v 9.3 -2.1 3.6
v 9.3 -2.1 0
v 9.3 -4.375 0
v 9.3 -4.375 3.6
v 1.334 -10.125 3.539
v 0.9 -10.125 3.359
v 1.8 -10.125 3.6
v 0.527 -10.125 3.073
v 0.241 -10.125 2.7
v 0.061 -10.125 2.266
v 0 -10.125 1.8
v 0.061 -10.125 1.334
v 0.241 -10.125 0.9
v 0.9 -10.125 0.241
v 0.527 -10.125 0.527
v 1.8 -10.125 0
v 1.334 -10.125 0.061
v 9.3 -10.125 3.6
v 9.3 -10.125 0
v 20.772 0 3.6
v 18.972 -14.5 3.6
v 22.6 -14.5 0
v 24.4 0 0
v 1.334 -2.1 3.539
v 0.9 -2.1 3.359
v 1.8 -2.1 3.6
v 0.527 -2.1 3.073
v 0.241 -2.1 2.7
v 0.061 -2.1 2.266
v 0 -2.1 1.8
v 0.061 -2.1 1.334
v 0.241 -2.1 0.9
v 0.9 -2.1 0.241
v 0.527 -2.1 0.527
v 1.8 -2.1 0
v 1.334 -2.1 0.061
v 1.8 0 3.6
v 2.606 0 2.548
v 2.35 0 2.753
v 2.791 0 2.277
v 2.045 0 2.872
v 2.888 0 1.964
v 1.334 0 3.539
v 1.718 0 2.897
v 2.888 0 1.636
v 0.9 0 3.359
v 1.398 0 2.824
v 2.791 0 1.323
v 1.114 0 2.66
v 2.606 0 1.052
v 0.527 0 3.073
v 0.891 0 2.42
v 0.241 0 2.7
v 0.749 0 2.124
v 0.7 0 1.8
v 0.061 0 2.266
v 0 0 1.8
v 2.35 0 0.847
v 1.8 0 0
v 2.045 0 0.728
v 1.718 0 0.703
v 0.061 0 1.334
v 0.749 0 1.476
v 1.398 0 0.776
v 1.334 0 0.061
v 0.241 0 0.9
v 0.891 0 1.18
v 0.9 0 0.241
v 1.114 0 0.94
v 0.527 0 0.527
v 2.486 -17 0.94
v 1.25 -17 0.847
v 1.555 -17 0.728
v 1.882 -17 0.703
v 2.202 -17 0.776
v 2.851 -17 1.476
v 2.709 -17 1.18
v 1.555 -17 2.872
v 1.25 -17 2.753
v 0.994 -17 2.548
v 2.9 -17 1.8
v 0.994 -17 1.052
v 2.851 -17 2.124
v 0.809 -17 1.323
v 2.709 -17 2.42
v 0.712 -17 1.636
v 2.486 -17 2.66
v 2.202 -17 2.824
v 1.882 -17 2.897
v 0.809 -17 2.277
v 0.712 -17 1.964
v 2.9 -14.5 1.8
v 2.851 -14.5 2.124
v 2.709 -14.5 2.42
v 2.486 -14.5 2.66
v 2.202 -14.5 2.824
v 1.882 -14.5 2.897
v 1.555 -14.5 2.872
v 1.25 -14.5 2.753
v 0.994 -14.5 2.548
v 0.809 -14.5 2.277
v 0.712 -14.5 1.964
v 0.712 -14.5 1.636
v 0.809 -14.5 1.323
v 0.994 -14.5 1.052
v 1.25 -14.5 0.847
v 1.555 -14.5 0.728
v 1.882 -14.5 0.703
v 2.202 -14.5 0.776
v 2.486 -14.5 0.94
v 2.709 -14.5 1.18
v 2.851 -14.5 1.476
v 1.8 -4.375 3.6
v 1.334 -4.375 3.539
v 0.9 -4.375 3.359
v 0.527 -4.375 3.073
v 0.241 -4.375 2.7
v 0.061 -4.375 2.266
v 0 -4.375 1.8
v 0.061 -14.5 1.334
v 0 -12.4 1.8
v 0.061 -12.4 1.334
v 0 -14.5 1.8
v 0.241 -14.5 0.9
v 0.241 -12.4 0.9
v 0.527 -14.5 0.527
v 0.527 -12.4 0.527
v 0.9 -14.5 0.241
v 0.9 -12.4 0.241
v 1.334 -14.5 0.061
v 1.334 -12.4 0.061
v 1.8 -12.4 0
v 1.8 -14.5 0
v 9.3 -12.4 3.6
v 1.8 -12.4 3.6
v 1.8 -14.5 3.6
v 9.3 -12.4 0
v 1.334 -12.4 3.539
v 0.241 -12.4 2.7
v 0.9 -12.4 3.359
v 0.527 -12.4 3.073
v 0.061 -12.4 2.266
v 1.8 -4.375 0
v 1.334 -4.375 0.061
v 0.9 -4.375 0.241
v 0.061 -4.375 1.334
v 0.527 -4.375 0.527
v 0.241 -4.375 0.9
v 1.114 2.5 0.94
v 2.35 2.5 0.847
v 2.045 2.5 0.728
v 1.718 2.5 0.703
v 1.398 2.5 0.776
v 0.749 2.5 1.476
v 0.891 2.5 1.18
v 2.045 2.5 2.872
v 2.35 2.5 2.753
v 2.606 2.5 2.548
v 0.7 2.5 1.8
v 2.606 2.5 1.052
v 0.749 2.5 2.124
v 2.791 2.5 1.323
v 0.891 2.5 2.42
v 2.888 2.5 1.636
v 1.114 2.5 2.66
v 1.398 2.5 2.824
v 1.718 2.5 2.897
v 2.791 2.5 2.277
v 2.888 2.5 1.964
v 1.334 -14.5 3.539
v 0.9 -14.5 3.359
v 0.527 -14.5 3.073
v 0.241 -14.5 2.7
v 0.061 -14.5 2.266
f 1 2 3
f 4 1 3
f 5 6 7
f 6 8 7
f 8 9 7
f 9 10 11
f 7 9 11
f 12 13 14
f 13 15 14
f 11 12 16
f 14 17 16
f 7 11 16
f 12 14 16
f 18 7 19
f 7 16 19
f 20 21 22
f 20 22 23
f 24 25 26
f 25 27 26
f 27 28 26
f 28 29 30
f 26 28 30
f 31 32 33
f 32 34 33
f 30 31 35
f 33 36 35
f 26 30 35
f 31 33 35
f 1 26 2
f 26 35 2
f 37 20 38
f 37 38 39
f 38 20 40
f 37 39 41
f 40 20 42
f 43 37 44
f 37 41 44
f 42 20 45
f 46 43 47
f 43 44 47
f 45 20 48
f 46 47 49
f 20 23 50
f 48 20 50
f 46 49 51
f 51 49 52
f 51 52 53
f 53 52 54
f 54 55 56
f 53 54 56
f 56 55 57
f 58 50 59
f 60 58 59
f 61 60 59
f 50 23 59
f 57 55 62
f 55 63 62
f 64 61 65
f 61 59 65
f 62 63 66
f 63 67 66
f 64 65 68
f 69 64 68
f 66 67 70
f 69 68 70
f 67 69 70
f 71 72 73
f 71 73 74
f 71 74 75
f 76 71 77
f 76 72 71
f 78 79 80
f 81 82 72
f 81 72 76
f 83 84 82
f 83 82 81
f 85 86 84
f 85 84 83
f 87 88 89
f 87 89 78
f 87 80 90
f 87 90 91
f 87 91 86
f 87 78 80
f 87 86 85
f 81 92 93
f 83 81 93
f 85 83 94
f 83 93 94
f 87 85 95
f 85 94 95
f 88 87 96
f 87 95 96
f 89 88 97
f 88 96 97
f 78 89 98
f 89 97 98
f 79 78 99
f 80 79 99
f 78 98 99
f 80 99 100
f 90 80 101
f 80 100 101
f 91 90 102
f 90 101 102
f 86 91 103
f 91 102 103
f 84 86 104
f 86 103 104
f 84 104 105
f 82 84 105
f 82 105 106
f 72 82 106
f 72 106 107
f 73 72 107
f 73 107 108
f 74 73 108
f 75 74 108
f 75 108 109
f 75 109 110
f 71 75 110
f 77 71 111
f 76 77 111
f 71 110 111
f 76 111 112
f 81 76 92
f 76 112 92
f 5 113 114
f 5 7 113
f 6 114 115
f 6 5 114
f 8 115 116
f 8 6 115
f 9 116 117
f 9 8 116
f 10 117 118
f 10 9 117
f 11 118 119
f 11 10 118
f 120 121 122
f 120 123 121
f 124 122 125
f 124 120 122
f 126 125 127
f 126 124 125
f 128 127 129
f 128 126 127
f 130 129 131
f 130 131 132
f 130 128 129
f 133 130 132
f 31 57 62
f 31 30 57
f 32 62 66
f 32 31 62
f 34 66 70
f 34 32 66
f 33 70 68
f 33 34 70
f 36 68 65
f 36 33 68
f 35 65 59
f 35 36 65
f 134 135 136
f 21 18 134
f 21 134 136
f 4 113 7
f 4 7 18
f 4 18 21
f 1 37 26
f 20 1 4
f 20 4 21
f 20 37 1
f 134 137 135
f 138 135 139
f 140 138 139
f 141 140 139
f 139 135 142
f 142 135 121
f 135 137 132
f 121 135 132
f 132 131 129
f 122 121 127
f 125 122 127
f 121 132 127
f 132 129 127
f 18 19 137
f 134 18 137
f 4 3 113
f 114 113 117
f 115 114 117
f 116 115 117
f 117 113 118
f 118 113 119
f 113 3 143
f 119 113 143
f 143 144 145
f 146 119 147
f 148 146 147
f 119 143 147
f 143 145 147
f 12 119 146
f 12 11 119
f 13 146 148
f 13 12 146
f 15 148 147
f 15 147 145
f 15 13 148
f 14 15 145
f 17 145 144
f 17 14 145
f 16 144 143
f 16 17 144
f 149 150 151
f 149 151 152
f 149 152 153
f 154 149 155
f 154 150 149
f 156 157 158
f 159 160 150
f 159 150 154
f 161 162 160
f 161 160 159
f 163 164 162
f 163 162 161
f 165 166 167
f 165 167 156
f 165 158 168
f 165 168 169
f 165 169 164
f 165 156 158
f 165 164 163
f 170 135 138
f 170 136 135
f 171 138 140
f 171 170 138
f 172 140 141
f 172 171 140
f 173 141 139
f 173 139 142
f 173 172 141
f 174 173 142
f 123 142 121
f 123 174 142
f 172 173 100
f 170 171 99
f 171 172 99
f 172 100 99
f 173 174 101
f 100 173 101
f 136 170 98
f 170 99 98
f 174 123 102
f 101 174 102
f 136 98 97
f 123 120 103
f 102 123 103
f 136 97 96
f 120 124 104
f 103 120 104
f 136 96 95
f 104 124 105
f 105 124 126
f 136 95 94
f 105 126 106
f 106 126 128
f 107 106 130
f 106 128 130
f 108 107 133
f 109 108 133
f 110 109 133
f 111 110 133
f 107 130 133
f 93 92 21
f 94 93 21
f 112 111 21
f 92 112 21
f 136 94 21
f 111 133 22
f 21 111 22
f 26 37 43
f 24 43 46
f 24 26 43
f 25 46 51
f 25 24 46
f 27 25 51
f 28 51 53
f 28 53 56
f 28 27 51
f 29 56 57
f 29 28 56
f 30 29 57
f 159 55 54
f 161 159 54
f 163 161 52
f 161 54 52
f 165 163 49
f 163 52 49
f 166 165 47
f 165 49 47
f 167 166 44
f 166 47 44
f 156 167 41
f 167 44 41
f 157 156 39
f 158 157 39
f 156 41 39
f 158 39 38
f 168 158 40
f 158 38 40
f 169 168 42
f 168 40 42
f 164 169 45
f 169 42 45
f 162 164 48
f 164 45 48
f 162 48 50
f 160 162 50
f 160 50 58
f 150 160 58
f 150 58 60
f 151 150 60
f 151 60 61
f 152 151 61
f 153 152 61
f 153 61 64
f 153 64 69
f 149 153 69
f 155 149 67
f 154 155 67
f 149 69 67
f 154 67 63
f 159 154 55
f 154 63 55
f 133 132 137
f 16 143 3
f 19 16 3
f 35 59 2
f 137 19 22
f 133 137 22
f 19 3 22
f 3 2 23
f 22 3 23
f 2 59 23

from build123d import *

# Parameters (mm, degrees)
F1_DEPTH  = 3.6
F2_SIZE2  = 3.59999
F2_SIZE   = 3.59999
F3_R      = 1.8
F4_R      = 1.79999
F5_R      = 1.8
F6_R      = 1.79999
F7_R      = 1.8
F8_R      = 1.79999
F9_R      = 1.1
F10_DEPTH = 2.5
F11_R     = 1.1
F12_DEPTH = 2.5


# Not quite as in the source:
# - a fillet or chamfer is up to 0.001 mm smaller than in the source, because OpenCascade refuses the exact size


with BuildPart() as f1:
    # F0 (on Top) → F1 (new body)
    with BuildSketch(Plane.XY):
        Polygon((24.4, 0), (0, 0), (0, -2.1), (9.3, -2.1), (9.3, -4.375), (0, -4.375), (0, -10.125), (9.3, -10.125), (9.3, -12.4), (0, -12.4), (0, -14.5), (22.6, -14.5), align=None)
    extrude(amount=F1_DEPTH)

    # F2 (size 3.6 and 3.6 in the source; OpenCascade refuses exactly that, so slightly less here)
    f2_edges = [f1.edges().sort_by_distance(p)[0] for p in [
        (23.5, -7.25, 3.6),
    ]]
    chamfer(f2_edges, length=F2_SIZE, length2=F2_SIZE2)

    # F3
    f3_edges = [f1.edges().sort_by_distance(p)[0] for p in [
        (0, -7.25, 3.6),
    ]]
    fillet(f3_edges, radius=F3_R)

    # F4 (radius 1.8 in the source; OpenCascade refuses exactly that, so slightly less here)
    f4_edges = [f1.edges().sort_by_distance(p)[0] for p in [
        (0, -7.25, 0),
    ]]
    fillet(f4_edges, radius=F4_R)

    # F5
    f5_edges = [f1.edges().sort_by_distance(p)[0] for p in [
        (0, -13.45, 3.6),
    ]]
    fillet(f5_edges, radius=F5_R)

    # F6 (radius 1.8 in the source; OpenCascade refuses exactly that, so slightly less here)
    f6_edges = [f1.edges().sort_by_distance(p)[0] for p in [
        (0, -13.45, 0),
    ]]
    fillet(f6_edges, radius=F6_R)

    # F7
    f7_edges = [f1.edges().sort_by_distance(p)[0] for p in [
        (0, -1.05, 3.6),
    ]]
    fillet(f7_edges, radius=F7_R)

    # F8 (radius 1.8 in the source; OpenCascade refuses exactly that, so slightly less here)
    f8_edges = [f1.edges().sort_by_distance(p)[0] for p in [
        (0, -1.05, 0),
    ]]
    fillet(f8_edges, radius=F8_R)

    # F9 (on face) → F10 (join)
    with BuildSketch(Plane.XZ.offset(14.5)):
        with Locations((1.8, 1.8)):
            Circle(F9_R)
    extrude(amount=F10_DEPTH)

    # F11 (on face) → F12 (join)
    with BuildSketch(Plane(origin=(0, 0, 0), x_dir=(-1, 0, 0), z_dir=(0, 1, 0))):
        with Locations((-1.8, 1.8)):
            Circle(F11_R)
    extrude(amount=F12_DEPTH)


solid = f1.part
